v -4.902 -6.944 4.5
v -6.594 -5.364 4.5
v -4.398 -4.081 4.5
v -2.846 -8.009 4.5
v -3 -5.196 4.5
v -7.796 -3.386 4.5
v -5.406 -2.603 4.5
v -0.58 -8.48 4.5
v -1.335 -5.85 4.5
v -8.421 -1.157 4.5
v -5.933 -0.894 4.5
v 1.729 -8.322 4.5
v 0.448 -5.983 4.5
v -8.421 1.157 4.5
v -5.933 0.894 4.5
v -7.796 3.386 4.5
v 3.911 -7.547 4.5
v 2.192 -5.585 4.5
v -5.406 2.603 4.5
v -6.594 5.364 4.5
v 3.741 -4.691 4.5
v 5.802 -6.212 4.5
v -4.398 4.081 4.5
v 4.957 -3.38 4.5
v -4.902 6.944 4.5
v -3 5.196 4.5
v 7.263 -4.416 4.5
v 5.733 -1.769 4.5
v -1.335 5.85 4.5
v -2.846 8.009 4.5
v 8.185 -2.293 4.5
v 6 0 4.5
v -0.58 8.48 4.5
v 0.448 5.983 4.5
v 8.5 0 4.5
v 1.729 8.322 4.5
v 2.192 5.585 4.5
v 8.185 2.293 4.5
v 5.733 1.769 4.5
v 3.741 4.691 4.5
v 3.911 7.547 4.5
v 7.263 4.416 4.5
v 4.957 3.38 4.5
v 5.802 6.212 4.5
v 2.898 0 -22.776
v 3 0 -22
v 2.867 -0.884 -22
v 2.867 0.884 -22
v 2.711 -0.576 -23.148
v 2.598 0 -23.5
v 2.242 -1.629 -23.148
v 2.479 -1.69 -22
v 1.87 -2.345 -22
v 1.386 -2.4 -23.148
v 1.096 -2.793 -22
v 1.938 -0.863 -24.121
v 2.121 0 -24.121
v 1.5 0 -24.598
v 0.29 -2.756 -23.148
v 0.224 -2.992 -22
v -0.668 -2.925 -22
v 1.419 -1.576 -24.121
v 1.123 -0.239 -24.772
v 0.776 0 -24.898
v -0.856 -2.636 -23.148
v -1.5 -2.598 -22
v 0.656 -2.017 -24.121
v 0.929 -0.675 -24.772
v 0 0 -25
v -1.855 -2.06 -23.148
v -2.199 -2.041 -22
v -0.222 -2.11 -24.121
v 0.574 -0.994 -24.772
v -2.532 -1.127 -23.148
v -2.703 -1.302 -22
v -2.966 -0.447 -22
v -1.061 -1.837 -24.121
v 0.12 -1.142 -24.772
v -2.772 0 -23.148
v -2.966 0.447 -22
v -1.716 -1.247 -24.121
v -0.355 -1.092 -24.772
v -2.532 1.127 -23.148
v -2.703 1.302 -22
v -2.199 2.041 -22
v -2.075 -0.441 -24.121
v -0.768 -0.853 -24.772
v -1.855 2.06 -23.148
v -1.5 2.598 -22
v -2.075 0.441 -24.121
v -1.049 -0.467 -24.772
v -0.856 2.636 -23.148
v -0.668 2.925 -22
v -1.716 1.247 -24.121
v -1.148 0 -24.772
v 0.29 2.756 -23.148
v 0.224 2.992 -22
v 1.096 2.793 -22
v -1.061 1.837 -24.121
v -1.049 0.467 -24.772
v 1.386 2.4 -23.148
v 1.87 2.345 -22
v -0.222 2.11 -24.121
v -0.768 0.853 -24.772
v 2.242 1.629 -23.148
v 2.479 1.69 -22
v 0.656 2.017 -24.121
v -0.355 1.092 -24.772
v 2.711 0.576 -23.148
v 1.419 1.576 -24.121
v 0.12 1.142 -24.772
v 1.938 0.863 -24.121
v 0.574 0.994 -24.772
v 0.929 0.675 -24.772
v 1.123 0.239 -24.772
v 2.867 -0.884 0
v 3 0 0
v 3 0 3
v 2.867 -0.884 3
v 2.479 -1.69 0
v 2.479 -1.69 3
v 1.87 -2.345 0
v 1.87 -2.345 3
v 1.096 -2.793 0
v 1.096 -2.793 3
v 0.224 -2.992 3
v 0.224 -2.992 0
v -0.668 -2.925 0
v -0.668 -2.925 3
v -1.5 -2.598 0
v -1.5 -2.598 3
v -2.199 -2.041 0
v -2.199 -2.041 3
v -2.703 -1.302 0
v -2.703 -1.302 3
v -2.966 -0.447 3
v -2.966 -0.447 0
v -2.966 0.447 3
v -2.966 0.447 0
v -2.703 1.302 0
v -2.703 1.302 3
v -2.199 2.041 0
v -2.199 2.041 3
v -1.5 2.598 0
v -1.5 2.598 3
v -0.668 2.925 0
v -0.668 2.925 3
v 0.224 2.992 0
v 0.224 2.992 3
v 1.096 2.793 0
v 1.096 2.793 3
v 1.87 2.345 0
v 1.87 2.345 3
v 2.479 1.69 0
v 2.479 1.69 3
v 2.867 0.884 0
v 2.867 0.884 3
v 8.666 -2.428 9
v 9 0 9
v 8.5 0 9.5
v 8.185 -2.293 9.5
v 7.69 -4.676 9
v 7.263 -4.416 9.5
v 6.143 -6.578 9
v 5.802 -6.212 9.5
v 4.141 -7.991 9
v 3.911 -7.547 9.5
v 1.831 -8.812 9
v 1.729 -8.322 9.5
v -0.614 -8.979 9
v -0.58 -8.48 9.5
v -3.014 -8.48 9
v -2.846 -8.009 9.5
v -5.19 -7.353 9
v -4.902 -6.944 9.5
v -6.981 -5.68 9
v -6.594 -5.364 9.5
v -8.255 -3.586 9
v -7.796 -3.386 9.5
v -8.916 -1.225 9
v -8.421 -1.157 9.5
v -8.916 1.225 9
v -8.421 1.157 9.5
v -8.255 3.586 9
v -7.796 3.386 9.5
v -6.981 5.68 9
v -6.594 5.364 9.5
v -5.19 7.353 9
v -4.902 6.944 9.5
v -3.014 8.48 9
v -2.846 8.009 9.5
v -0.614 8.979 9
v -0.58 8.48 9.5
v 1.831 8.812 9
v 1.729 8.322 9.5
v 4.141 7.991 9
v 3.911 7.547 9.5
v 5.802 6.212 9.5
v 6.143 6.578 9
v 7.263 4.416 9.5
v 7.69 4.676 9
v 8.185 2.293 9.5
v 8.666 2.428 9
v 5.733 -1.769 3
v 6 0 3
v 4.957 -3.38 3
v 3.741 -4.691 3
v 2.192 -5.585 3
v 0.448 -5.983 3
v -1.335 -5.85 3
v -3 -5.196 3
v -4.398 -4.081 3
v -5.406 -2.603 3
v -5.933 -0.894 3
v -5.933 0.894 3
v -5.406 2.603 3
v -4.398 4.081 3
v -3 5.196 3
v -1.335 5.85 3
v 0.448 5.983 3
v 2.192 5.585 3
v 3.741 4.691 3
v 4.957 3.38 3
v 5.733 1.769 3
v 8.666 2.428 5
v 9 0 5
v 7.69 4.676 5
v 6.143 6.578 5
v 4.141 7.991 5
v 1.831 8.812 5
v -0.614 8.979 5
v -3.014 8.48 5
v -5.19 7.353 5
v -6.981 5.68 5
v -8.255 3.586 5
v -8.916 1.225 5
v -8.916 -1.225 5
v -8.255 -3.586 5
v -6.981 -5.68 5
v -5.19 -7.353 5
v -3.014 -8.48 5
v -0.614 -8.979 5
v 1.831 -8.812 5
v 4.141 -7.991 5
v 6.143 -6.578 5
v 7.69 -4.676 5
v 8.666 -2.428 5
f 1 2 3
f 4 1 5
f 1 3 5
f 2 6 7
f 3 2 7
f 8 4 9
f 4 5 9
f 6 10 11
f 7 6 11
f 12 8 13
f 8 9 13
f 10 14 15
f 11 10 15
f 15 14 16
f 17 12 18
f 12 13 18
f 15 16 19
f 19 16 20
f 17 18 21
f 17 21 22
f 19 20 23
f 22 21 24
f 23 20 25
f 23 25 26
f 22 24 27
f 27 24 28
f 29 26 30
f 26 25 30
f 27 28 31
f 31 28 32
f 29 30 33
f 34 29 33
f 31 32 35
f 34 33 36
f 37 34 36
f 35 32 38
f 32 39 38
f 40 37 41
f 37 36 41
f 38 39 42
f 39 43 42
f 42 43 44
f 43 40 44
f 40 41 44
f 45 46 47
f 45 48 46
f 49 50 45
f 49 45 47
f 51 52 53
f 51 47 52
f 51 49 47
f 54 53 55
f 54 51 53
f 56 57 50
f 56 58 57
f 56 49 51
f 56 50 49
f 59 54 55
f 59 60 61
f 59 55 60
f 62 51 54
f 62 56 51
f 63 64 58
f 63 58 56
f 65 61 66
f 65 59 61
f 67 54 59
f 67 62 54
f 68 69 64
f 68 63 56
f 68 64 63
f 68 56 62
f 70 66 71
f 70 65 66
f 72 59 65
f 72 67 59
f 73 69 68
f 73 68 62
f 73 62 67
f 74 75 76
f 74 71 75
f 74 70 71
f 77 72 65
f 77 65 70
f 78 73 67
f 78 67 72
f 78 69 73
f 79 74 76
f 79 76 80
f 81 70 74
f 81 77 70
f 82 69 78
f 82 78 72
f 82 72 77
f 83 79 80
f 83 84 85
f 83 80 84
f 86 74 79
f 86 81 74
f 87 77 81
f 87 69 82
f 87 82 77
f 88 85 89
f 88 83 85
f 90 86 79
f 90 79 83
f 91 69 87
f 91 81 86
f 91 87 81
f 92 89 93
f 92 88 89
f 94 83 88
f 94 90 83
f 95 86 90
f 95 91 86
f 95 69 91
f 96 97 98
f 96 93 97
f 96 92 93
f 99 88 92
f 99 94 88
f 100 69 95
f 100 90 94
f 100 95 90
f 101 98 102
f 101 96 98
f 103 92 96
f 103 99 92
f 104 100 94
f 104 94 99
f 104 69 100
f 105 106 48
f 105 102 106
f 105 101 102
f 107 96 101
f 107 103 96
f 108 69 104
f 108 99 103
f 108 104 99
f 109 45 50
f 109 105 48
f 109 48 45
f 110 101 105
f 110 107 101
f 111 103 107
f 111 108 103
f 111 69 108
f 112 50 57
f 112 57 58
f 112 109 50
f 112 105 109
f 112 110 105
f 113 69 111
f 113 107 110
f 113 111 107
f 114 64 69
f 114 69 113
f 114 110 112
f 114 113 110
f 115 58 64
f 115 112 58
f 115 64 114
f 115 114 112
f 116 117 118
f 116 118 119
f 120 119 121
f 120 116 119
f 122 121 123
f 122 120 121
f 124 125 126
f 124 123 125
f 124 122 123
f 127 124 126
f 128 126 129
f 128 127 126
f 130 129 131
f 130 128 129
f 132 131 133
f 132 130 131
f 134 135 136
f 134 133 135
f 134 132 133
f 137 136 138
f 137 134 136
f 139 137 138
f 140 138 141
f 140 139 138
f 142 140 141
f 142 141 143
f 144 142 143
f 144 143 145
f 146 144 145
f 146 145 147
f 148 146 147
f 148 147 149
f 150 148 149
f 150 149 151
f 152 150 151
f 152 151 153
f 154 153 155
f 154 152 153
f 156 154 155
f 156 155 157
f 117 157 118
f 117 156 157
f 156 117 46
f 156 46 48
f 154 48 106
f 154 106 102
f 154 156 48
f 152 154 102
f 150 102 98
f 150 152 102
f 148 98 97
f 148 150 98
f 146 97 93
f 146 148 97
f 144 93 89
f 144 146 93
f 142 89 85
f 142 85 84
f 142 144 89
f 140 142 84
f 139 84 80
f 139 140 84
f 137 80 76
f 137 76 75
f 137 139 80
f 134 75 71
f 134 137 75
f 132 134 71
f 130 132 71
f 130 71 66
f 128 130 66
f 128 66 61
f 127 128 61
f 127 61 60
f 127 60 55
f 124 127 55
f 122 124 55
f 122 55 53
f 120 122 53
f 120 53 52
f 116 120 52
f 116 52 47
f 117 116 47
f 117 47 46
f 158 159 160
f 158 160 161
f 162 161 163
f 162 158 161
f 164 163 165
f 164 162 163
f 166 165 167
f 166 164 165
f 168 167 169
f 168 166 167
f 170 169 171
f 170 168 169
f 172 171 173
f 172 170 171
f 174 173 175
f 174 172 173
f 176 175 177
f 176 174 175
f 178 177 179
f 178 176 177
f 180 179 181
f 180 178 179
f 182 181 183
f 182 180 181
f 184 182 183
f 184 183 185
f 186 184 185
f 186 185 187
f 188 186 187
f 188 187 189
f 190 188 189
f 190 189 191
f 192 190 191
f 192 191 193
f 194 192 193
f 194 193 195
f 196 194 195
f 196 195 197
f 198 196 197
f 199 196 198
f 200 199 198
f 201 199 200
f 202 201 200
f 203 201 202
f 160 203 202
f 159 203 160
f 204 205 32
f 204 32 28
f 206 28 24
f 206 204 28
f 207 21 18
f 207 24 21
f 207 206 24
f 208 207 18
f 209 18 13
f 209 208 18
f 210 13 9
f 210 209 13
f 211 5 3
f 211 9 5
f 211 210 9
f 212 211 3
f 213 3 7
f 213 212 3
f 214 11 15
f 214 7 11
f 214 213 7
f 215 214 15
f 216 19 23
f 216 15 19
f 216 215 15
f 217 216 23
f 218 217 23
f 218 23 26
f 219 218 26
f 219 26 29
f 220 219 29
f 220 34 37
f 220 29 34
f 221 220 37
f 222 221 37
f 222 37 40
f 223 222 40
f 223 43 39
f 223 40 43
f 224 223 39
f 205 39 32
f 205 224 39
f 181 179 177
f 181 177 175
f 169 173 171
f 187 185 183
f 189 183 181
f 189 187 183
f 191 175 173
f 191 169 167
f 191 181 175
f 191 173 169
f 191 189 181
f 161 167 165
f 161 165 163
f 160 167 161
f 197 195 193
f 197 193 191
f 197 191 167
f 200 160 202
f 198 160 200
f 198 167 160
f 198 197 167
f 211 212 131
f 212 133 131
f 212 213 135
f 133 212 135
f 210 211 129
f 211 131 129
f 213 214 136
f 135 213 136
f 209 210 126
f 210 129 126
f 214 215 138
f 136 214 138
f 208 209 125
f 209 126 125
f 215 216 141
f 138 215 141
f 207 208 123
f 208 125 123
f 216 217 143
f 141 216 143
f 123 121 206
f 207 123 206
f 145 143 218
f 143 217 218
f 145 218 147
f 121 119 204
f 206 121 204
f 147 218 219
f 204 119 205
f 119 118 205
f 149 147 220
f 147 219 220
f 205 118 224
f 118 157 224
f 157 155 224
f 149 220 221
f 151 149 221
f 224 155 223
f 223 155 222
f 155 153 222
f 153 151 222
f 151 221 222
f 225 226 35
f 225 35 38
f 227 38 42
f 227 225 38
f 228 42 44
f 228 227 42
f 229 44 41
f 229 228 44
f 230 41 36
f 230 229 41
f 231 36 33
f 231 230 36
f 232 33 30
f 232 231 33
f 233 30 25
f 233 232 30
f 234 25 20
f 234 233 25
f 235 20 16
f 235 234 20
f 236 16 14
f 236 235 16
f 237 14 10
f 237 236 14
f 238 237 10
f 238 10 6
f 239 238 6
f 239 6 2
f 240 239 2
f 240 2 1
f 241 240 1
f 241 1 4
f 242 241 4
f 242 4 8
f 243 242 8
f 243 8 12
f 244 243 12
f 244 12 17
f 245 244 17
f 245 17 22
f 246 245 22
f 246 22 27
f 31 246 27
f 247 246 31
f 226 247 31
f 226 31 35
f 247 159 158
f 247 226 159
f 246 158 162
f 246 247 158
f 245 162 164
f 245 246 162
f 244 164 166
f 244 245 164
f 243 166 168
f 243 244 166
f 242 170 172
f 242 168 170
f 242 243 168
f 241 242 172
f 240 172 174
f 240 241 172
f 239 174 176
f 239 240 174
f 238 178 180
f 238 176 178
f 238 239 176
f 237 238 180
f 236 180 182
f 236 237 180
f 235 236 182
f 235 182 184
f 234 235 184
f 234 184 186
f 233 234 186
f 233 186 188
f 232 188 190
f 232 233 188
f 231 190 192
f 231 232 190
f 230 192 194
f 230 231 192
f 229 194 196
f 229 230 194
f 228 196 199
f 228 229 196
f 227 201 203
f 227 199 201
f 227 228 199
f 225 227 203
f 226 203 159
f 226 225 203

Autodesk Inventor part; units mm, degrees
ref_plane "YZ Plane" through (0, 0, 0) normal (1, 0, 0) x (0, 1, 0)
ref_plane "XZ Plane" through (0, 0, 0) normal (0, 1, 0) x (-1, 0, 0)
ref_plane "XY Plane" through (0, 0, 0) normal (0, 0, 1) x (1, 0, 0)
sketch "Esboço1" plane through (0, 0, 0) normal (0, 0, 1) x (1, 0, 0)
  circle A0 centre (0, 0) radius 3.5 projected
  circle A1 centre (0, 0) radius 3
  point P0 (0, 0)
  dimension "d0" = 6
extrude "Extrusão1" add sketch "Esboço1" against normal blind 25 contours A1
fillet "Arredondamento1" radius 3 1 edges at (-3, 0, -25)
sketch "Esboço2" plane through (0, 0, 0) normal (0, 0, 1) x (1, 0, 0)
  circle A0 centre (0, 0) radius 3 projected
  point P0 (0, 0)
extrude "Extrusão2" add sketch "Esboço2" along normal blind 3
sketch "Esboço3" plane through (0, 0, 3) normal (0, 0, 1) x (1, 0, 0)
  circle A0 centre (0, 0) radius 3 projected
  circle A1 centre (0, 0) radius 6
  point P0 (0, 0)
  dimension "d6" = 12
extrude "Extrusão3" add sketch "Esboço3" along normal blind 1.5 contours A0 | A1
sketch "Esboço4" plane through (0, 0, 4.5) normal (0, 0, 1) x (1, 0, 0)
  circle A0 centre (0, 0) radius 9
  dimension "d9" = 18
extrude "Extrusão4" add sketch "Esboço4" along normal blind 5
chamfer "Chanfro1" distance 0.5 angle 45 2 edges at (-9, 0, 9.5) (-9, 0, 4.5)
properties part number "Pino de Liberação Valvula Alivio de Pressão"
